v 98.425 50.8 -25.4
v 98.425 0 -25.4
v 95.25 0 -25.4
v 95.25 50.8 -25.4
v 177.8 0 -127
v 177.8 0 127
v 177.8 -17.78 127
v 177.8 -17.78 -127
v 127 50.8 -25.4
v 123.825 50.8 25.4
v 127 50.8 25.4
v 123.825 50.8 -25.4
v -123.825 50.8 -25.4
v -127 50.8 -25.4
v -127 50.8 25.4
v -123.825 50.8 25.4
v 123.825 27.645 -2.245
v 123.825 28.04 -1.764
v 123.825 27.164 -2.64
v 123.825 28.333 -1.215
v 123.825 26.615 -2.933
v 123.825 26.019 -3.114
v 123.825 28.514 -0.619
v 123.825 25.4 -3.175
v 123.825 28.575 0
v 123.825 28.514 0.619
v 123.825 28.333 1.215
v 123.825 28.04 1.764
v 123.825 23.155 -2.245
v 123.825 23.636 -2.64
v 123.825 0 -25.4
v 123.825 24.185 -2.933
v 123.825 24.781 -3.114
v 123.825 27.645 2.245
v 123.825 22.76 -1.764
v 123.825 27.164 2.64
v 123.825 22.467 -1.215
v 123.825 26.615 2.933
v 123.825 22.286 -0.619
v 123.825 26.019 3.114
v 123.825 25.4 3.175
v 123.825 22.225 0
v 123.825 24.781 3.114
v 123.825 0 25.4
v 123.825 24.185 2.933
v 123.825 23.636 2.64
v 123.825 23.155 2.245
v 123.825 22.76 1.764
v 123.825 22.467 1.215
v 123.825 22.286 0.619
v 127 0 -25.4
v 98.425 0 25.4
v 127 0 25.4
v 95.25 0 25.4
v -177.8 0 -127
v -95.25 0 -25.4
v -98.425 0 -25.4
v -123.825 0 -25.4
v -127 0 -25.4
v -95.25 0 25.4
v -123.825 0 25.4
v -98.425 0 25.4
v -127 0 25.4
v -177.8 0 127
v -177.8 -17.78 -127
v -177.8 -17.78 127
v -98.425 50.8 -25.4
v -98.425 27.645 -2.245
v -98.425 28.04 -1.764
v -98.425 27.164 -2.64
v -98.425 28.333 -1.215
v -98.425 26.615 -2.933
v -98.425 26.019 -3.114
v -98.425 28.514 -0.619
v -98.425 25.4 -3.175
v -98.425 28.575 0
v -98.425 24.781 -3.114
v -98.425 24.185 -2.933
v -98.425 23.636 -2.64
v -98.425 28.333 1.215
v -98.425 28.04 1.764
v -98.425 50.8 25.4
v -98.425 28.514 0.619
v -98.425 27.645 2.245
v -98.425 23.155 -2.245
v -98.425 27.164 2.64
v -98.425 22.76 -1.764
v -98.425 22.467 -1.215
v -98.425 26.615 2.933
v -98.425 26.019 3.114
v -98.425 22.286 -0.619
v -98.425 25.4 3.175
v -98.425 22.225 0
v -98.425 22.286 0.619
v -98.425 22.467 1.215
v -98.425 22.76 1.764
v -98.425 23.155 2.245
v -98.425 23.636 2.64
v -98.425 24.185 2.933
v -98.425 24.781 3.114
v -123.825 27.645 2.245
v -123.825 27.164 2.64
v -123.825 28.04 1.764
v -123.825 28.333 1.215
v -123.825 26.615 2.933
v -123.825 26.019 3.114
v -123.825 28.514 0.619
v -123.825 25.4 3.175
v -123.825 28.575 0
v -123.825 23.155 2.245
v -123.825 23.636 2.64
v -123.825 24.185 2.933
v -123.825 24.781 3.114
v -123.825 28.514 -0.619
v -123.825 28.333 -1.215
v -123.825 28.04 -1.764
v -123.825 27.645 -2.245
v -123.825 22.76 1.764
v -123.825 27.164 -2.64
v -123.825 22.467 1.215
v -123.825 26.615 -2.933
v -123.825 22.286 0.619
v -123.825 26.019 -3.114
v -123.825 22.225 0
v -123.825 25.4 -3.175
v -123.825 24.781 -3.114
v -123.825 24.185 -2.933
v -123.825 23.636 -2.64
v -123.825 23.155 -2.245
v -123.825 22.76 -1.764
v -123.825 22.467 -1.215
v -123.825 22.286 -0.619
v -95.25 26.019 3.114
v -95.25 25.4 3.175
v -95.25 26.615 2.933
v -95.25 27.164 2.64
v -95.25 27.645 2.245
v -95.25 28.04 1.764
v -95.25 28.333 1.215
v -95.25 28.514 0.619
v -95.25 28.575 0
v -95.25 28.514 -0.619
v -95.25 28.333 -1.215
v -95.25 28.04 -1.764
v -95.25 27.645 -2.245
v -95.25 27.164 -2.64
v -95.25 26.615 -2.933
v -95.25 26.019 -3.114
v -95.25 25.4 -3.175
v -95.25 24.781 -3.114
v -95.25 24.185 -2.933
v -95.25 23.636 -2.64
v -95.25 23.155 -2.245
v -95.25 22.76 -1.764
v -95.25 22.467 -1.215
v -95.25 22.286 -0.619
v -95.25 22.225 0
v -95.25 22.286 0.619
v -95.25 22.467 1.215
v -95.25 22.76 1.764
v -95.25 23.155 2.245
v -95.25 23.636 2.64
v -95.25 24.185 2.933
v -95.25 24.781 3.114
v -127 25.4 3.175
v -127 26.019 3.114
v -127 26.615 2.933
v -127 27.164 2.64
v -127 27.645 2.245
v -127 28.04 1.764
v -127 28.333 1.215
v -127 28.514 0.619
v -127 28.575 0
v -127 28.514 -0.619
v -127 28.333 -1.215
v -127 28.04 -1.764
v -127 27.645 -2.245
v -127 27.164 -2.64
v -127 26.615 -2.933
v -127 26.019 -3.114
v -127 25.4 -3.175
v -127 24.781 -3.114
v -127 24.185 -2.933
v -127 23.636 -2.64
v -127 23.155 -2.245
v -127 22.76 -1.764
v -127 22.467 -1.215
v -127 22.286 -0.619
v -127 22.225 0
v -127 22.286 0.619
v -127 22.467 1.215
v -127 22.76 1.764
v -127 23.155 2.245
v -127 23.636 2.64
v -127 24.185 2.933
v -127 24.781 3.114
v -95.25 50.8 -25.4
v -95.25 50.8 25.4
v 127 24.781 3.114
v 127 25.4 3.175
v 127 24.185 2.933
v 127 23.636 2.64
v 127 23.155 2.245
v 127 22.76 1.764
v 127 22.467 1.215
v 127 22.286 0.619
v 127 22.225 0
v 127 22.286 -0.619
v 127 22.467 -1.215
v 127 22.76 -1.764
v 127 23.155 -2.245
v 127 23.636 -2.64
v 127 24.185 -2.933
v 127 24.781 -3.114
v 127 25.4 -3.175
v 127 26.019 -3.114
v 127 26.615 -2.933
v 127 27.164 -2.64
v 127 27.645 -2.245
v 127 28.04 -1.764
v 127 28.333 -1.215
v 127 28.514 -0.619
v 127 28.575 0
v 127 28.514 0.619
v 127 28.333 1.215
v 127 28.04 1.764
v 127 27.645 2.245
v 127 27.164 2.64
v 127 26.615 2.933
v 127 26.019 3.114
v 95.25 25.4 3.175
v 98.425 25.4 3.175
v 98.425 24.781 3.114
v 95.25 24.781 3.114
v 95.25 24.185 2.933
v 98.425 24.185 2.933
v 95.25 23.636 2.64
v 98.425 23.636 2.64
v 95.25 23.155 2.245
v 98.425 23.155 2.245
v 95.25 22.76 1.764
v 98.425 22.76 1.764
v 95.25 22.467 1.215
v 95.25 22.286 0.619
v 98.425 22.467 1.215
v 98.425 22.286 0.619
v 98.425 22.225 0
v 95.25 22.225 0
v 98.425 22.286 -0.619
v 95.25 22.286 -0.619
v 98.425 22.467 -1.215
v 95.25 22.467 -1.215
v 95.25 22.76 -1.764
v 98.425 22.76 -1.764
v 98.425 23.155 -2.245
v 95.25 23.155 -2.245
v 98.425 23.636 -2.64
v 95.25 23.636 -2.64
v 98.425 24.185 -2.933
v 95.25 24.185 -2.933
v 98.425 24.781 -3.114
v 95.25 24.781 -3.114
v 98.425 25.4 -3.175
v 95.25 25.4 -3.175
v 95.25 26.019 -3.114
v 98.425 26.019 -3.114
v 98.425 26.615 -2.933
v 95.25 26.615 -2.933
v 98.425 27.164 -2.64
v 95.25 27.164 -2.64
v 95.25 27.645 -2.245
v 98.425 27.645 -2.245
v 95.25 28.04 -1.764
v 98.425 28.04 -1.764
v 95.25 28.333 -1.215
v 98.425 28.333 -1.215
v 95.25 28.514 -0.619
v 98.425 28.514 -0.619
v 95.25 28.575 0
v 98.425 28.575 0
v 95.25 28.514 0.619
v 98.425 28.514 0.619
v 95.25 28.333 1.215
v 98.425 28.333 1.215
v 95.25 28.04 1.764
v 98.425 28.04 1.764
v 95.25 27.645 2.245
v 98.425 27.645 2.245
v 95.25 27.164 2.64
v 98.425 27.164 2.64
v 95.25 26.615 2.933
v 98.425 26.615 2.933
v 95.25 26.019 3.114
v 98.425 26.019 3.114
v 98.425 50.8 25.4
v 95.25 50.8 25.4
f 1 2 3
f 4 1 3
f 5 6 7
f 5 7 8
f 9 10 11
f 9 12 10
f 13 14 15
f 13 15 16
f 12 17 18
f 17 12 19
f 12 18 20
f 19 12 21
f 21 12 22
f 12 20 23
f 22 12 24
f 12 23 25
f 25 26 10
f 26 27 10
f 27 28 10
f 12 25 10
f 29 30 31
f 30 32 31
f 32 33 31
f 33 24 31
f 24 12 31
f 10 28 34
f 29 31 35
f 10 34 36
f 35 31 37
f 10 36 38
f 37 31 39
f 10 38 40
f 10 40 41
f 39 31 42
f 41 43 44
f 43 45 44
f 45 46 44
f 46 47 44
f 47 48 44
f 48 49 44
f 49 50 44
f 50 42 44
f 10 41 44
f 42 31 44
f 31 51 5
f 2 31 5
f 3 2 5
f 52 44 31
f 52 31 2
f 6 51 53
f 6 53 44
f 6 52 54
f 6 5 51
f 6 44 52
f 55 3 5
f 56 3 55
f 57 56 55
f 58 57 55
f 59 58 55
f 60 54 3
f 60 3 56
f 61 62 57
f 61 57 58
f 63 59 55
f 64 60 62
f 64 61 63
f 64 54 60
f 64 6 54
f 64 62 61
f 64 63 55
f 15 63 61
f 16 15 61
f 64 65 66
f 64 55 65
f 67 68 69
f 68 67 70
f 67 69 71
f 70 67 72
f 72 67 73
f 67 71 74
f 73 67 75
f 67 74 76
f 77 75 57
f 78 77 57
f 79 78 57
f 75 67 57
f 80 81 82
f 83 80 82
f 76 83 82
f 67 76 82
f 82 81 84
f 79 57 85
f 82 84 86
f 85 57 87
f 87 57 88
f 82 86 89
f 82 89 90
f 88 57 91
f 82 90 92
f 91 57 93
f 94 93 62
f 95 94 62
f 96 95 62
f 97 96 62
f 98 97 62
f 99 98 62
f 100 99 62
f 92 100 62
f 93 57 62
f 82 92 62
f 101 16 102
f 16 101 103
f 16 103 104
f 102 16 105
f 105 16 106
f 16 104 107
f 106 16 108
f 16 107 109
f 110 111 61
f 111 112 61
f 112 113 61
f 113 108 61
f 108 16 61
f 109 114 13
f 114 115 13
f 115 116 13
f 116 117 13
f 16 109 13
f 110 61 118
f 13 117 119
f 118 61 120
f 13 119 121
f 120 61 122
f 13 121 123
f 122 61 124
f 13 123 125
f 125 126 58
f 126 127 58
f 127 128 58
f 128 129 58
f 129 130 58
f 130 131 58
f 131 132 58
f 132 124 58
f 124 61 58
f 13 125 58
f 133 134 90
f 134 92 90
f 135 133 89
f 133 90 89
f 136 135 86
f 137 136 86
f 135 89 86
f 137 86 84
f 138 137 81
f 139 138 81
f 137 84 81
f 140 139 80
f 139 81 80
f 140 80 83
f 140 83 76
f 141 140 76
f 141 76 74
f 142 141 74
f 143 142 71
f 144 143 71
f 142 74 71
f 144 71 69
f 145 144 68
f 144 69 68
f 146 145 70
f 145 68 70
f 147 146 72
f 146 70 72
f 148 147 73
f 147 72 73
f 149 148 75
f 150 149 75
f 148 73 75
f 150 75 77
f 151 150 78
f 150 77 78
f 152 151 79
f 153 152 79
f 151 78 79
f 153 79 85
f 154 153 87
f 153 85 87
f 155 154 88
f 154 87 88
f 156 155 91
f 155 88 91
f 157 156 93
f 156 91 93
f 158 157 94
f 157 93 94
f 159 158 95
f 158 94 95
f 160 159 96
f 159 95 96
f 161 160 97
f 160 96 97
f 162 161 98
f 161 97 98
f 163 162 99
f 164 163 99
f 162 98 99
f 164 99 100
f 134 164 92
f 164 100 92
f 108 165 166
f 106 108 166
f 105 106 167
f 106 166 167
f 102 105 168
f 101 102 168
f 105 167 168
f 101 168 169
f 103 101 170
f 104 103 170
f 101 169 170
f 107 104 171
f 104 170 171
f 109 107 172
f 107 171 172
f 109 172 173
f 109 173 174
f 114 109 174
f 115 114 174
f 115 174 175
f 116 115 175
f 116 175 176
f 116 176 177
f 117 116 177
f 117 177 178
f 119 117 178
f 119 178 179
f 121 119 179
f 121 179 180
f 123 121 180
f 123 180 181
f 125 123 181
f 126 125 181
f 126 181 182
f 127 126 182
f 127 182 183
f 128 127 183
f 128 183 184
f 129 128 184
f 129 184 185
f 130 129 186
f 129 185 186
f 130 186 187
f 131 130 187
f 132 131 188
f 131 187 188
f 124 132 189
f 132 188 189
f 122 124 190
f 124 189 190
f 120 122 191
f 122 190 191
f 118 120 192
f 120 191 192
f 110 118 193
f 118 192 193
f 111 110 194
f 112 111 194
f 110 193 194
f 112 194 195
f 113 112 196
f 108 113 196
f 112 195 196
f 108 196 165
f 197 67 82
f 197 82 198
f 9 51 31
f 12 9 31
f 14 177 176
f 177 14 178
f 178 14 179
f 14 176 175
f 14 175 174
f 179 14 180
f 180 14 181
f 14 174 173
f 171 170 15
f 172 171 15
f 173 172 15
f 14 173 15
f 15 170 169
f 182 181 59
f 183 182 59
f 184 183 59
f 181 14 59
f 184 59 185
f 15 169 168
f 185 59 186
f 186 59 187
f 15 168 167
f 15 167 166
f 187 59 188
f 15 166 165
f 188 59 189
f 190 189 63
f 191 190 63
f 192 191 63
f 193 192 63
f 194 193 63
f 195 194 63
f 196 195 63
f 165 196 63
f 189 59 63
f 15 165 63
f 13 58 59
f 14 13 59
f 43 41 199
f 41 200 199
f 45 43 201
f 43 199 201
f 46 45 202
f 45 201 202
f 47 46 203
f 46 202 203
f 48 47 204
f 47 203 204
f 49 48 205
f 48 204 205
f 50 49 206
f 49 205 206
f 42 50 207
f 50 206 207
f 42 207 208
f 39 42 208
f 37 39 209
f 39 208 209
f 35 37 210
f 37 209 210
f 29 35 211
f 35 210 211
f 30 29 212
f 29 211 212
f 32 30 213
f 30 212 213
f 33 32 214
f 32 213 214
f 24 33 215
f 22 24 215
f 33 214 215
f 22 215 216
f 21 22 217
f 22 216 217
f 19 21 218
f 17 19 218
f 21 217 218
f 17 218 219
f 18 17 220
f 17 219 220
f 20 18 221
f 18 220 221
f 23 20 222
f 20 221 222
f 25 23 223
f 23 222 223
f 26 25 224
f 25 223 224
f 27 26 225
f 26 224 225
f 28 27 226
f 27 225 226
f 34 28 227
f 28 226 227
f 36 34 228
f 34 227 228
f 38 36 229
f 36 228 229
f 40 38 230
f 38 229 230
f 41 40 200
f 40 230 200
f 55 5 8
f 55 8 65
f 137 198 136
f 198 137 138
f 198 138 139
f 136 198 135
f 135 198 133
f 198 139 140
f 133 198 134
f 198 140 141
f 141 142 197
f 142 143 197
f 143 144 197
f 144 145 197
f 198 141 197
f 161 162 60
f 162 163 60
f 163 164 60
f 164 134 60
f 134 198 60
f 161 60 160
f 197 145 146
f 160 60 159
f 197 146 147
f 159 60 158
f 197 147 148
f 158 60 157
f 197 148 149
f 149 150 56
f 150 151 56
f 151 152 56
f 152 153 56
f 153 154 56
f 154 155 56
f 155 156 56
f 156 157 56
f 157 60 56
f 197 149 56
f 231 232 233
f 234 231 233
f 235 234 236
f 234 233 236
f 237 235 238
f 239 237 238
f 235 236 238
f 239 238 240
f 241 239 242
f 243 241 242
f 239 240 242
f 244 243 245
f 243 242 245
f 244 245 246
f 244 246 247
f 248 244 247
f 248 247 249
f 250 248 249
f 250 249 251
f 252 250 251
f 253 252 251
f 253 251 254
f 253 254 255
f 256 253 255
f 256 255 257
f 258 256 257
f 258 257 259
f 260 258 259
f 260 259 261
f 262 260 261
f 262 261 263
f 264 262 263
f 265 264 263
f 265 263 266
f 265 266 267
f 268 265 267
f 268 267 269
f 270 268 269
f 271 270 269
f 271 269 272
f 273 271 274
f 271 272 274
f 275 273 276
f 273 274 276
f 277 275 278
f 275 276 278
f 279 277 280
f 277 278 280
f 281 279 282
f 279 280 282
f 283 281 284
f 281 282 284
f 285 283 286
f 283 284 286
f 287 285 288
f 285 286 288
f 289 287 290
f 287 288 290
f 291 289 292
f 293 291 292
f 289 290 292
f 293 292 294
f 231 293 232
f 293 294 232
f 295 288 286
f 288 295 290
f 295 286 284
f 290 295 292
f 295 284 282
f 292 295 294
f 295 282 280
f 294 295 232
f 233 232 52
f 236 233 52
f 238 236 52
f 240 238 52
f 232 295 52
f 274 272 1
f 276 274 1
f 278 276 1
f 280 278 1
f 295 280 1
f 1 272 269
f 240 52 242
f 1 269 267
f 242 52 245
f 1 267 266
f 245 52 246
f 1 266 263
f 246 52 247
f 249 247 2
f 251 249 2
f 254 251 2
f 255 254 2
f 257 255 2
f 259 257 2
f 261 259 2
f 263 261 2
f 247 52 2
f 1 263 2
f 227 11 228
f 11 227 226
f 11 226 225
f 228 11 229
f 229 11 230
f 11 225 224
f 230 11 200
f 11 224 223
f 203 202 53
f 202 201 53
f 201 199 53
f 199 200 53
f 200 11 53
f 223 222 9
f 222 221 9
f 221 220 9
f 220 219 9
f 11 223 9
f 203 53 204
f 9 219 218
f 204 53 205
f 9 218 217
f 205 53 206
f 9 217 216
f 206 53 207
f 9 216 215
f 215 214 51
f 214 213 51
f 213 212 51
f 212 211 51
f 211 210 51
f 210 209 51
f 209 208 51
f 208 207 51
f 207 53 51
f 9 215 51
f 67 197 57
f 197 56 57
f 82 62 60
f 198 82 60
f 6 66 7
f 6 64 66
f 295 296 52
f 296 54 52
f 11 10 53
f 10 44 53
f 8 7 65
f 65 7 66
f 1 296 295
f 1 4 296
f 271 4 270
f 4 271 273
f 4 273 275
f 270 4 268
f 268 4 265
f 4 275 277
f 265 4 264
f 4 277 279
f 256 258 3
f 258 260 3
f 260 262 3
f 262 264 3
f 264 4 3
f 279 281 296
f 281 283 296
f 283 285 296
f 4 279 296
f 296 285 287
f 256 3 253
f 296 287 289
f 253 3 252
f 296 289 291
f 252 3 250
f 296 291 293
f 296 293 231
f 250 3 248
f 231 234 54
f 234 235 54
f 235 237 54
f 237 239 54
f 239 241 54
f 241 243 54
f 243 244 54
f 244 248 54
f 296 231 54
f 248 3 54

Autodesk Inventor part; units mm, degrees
ref_plane "XZ Plane" through (0, 0, 0) normal (0, 1, 0) x (-1, 0, 0)
ref_plane "XY Plane" through (0, 0, 0) normal (0, 0, 1) x (1, 0, 0)
sketch "Sketch1" plane through (0, 0, 0) normal (0, 1, 0) x (-1, 0, 0)
  line L0 (-177.8, 127) -> (-177.8, -127)
  line L1 (-177.8, -127) -> (177.8, -127)
  line L2 (177.8, -127) -> (177.8, 127)
  line L3 (177.8, 127) -> (-177.8, 127)
  line L4 (-177.8, 127) -> (177.8, -127) construction
  line L5 (-177.8, -127) -> (177.8, 127) construction
  point P0 (0, 0)
  dimension "d0" = 355.6
  dimension "d1" = 254
extrude "Extrusion1" add sketch "Sketch1" against normal blind 17.78
sketch "Sketch3" plane through (0, 0, 0) normal (0, 1, 0) x (1, 0, 0)
  line L0 (-177.8, -127) -> (-177.8, 127) construction
  line L1 (-177.8, 0) -> (177.8, 0) construction
  line L2 (177.8, 127) -> (177.8, -127) construction
  line L3 (-127, -25.4) -> (-123.825, -25.4)
  line L4 (-123.825, -25.4) -> (-123.825, 25.4)
  line L5 (-123.825, 25.4) -> (-127, 25.4)
  line L6 (-127, 25.4) -> (-127, -25.4)
  line L7 (-127, -25.4) -> (-123.825, 25.4) construction
  line L8 (-123.825, -25.4) -> (-127, 25.4) construction
  line L9 (-98.425, -25.4) -> (-95.25, -25.4)
  line L10 (-95.25, -25.4) -> (-95.25, 25.4)
  line L11 (-95.25, 25.4) -> (-98.425, 25.4)
  line L12 (-98.425, 25.4) -> (-98.425, -25.4)
  line L13 (-98.425, -25.4) -> (-95.25, 25.4) construction
  line L14 (-95.25, -25.4) -> (-98.425, 25.4) construction
  line L15 (-177.8, 127) -> (177.8, 127) construction
  line L16 (0, 127) -> (0, -127) construction
  line L17 (177.8, -127) -> (-177.8, -127) construction
  point P0 (0, 0)
  point P1 (-125.4125, 0)
  point P2 (-96.8375, 0)
  dimension "d4" = 50.8
  dimension "d5" = 3.175
  dimension "d6" = 50.8
  dimension "d7" = 25.4
extrude "Extrusion2" add sketch "Sketch3" along normal blind 50.8
sketch "Sketch4" plane through (-127, 0, -25.4) normal (-1, 0, 0) x (0, 0, 1)
  line L0 (25.4, 0) -> (25.4, 50.8) construction
  line L1 (50.8, 50.8) -> (0, 50.8) construction
  circle A0 centre (25.4, 25.4) radius 3.175
  dimension "d10" = 6.35
  dimension "d11" = 25.4
extrude "Extrusion3" cut sketch "Sketch4" against normal through all
mirror "Mirror2" about plane through (0, 0, 0) normal (1, 0, 0) of "Extrusion2", "Extrusion3"
equation "\"d0\" = plateWidth"
equation "\"d1\" = plateLength"
equation "\"d2\" = plateThickness"
equation "\"d4\" = bracketDistanceFromEdge"
equation "\"d5\" = bracketWidth"
equation "\"d6\" = bracketLength"
equation "\"d8\" = bracketHeight"
equation "\"d10\" = axelDiam"
equation "\"d11\" = axelHoleDistanceFromTopOfBracket"
equation "\"d12\" = bracketHeight"
equation "\"plateWidth\" = 355.6"
equation "\"plateLength\" = 254"
equation "\"plateThickness\" = 17.78"
equation "\"bracketDistanceFromEdge\" = 50.8"
equation "\"bracketWidth\" = 3.175"
equation "\"bracketHeight\" = 50.8"
equation "\"bracketLength\" = 50.8"
equation "\"axelDiam\" = 6.35"
equation "\"axelHoleDistanceFromTopOfBracket\" = 25.4"
properties part number "ExampleOfUsingSnowBlowerMotor"
